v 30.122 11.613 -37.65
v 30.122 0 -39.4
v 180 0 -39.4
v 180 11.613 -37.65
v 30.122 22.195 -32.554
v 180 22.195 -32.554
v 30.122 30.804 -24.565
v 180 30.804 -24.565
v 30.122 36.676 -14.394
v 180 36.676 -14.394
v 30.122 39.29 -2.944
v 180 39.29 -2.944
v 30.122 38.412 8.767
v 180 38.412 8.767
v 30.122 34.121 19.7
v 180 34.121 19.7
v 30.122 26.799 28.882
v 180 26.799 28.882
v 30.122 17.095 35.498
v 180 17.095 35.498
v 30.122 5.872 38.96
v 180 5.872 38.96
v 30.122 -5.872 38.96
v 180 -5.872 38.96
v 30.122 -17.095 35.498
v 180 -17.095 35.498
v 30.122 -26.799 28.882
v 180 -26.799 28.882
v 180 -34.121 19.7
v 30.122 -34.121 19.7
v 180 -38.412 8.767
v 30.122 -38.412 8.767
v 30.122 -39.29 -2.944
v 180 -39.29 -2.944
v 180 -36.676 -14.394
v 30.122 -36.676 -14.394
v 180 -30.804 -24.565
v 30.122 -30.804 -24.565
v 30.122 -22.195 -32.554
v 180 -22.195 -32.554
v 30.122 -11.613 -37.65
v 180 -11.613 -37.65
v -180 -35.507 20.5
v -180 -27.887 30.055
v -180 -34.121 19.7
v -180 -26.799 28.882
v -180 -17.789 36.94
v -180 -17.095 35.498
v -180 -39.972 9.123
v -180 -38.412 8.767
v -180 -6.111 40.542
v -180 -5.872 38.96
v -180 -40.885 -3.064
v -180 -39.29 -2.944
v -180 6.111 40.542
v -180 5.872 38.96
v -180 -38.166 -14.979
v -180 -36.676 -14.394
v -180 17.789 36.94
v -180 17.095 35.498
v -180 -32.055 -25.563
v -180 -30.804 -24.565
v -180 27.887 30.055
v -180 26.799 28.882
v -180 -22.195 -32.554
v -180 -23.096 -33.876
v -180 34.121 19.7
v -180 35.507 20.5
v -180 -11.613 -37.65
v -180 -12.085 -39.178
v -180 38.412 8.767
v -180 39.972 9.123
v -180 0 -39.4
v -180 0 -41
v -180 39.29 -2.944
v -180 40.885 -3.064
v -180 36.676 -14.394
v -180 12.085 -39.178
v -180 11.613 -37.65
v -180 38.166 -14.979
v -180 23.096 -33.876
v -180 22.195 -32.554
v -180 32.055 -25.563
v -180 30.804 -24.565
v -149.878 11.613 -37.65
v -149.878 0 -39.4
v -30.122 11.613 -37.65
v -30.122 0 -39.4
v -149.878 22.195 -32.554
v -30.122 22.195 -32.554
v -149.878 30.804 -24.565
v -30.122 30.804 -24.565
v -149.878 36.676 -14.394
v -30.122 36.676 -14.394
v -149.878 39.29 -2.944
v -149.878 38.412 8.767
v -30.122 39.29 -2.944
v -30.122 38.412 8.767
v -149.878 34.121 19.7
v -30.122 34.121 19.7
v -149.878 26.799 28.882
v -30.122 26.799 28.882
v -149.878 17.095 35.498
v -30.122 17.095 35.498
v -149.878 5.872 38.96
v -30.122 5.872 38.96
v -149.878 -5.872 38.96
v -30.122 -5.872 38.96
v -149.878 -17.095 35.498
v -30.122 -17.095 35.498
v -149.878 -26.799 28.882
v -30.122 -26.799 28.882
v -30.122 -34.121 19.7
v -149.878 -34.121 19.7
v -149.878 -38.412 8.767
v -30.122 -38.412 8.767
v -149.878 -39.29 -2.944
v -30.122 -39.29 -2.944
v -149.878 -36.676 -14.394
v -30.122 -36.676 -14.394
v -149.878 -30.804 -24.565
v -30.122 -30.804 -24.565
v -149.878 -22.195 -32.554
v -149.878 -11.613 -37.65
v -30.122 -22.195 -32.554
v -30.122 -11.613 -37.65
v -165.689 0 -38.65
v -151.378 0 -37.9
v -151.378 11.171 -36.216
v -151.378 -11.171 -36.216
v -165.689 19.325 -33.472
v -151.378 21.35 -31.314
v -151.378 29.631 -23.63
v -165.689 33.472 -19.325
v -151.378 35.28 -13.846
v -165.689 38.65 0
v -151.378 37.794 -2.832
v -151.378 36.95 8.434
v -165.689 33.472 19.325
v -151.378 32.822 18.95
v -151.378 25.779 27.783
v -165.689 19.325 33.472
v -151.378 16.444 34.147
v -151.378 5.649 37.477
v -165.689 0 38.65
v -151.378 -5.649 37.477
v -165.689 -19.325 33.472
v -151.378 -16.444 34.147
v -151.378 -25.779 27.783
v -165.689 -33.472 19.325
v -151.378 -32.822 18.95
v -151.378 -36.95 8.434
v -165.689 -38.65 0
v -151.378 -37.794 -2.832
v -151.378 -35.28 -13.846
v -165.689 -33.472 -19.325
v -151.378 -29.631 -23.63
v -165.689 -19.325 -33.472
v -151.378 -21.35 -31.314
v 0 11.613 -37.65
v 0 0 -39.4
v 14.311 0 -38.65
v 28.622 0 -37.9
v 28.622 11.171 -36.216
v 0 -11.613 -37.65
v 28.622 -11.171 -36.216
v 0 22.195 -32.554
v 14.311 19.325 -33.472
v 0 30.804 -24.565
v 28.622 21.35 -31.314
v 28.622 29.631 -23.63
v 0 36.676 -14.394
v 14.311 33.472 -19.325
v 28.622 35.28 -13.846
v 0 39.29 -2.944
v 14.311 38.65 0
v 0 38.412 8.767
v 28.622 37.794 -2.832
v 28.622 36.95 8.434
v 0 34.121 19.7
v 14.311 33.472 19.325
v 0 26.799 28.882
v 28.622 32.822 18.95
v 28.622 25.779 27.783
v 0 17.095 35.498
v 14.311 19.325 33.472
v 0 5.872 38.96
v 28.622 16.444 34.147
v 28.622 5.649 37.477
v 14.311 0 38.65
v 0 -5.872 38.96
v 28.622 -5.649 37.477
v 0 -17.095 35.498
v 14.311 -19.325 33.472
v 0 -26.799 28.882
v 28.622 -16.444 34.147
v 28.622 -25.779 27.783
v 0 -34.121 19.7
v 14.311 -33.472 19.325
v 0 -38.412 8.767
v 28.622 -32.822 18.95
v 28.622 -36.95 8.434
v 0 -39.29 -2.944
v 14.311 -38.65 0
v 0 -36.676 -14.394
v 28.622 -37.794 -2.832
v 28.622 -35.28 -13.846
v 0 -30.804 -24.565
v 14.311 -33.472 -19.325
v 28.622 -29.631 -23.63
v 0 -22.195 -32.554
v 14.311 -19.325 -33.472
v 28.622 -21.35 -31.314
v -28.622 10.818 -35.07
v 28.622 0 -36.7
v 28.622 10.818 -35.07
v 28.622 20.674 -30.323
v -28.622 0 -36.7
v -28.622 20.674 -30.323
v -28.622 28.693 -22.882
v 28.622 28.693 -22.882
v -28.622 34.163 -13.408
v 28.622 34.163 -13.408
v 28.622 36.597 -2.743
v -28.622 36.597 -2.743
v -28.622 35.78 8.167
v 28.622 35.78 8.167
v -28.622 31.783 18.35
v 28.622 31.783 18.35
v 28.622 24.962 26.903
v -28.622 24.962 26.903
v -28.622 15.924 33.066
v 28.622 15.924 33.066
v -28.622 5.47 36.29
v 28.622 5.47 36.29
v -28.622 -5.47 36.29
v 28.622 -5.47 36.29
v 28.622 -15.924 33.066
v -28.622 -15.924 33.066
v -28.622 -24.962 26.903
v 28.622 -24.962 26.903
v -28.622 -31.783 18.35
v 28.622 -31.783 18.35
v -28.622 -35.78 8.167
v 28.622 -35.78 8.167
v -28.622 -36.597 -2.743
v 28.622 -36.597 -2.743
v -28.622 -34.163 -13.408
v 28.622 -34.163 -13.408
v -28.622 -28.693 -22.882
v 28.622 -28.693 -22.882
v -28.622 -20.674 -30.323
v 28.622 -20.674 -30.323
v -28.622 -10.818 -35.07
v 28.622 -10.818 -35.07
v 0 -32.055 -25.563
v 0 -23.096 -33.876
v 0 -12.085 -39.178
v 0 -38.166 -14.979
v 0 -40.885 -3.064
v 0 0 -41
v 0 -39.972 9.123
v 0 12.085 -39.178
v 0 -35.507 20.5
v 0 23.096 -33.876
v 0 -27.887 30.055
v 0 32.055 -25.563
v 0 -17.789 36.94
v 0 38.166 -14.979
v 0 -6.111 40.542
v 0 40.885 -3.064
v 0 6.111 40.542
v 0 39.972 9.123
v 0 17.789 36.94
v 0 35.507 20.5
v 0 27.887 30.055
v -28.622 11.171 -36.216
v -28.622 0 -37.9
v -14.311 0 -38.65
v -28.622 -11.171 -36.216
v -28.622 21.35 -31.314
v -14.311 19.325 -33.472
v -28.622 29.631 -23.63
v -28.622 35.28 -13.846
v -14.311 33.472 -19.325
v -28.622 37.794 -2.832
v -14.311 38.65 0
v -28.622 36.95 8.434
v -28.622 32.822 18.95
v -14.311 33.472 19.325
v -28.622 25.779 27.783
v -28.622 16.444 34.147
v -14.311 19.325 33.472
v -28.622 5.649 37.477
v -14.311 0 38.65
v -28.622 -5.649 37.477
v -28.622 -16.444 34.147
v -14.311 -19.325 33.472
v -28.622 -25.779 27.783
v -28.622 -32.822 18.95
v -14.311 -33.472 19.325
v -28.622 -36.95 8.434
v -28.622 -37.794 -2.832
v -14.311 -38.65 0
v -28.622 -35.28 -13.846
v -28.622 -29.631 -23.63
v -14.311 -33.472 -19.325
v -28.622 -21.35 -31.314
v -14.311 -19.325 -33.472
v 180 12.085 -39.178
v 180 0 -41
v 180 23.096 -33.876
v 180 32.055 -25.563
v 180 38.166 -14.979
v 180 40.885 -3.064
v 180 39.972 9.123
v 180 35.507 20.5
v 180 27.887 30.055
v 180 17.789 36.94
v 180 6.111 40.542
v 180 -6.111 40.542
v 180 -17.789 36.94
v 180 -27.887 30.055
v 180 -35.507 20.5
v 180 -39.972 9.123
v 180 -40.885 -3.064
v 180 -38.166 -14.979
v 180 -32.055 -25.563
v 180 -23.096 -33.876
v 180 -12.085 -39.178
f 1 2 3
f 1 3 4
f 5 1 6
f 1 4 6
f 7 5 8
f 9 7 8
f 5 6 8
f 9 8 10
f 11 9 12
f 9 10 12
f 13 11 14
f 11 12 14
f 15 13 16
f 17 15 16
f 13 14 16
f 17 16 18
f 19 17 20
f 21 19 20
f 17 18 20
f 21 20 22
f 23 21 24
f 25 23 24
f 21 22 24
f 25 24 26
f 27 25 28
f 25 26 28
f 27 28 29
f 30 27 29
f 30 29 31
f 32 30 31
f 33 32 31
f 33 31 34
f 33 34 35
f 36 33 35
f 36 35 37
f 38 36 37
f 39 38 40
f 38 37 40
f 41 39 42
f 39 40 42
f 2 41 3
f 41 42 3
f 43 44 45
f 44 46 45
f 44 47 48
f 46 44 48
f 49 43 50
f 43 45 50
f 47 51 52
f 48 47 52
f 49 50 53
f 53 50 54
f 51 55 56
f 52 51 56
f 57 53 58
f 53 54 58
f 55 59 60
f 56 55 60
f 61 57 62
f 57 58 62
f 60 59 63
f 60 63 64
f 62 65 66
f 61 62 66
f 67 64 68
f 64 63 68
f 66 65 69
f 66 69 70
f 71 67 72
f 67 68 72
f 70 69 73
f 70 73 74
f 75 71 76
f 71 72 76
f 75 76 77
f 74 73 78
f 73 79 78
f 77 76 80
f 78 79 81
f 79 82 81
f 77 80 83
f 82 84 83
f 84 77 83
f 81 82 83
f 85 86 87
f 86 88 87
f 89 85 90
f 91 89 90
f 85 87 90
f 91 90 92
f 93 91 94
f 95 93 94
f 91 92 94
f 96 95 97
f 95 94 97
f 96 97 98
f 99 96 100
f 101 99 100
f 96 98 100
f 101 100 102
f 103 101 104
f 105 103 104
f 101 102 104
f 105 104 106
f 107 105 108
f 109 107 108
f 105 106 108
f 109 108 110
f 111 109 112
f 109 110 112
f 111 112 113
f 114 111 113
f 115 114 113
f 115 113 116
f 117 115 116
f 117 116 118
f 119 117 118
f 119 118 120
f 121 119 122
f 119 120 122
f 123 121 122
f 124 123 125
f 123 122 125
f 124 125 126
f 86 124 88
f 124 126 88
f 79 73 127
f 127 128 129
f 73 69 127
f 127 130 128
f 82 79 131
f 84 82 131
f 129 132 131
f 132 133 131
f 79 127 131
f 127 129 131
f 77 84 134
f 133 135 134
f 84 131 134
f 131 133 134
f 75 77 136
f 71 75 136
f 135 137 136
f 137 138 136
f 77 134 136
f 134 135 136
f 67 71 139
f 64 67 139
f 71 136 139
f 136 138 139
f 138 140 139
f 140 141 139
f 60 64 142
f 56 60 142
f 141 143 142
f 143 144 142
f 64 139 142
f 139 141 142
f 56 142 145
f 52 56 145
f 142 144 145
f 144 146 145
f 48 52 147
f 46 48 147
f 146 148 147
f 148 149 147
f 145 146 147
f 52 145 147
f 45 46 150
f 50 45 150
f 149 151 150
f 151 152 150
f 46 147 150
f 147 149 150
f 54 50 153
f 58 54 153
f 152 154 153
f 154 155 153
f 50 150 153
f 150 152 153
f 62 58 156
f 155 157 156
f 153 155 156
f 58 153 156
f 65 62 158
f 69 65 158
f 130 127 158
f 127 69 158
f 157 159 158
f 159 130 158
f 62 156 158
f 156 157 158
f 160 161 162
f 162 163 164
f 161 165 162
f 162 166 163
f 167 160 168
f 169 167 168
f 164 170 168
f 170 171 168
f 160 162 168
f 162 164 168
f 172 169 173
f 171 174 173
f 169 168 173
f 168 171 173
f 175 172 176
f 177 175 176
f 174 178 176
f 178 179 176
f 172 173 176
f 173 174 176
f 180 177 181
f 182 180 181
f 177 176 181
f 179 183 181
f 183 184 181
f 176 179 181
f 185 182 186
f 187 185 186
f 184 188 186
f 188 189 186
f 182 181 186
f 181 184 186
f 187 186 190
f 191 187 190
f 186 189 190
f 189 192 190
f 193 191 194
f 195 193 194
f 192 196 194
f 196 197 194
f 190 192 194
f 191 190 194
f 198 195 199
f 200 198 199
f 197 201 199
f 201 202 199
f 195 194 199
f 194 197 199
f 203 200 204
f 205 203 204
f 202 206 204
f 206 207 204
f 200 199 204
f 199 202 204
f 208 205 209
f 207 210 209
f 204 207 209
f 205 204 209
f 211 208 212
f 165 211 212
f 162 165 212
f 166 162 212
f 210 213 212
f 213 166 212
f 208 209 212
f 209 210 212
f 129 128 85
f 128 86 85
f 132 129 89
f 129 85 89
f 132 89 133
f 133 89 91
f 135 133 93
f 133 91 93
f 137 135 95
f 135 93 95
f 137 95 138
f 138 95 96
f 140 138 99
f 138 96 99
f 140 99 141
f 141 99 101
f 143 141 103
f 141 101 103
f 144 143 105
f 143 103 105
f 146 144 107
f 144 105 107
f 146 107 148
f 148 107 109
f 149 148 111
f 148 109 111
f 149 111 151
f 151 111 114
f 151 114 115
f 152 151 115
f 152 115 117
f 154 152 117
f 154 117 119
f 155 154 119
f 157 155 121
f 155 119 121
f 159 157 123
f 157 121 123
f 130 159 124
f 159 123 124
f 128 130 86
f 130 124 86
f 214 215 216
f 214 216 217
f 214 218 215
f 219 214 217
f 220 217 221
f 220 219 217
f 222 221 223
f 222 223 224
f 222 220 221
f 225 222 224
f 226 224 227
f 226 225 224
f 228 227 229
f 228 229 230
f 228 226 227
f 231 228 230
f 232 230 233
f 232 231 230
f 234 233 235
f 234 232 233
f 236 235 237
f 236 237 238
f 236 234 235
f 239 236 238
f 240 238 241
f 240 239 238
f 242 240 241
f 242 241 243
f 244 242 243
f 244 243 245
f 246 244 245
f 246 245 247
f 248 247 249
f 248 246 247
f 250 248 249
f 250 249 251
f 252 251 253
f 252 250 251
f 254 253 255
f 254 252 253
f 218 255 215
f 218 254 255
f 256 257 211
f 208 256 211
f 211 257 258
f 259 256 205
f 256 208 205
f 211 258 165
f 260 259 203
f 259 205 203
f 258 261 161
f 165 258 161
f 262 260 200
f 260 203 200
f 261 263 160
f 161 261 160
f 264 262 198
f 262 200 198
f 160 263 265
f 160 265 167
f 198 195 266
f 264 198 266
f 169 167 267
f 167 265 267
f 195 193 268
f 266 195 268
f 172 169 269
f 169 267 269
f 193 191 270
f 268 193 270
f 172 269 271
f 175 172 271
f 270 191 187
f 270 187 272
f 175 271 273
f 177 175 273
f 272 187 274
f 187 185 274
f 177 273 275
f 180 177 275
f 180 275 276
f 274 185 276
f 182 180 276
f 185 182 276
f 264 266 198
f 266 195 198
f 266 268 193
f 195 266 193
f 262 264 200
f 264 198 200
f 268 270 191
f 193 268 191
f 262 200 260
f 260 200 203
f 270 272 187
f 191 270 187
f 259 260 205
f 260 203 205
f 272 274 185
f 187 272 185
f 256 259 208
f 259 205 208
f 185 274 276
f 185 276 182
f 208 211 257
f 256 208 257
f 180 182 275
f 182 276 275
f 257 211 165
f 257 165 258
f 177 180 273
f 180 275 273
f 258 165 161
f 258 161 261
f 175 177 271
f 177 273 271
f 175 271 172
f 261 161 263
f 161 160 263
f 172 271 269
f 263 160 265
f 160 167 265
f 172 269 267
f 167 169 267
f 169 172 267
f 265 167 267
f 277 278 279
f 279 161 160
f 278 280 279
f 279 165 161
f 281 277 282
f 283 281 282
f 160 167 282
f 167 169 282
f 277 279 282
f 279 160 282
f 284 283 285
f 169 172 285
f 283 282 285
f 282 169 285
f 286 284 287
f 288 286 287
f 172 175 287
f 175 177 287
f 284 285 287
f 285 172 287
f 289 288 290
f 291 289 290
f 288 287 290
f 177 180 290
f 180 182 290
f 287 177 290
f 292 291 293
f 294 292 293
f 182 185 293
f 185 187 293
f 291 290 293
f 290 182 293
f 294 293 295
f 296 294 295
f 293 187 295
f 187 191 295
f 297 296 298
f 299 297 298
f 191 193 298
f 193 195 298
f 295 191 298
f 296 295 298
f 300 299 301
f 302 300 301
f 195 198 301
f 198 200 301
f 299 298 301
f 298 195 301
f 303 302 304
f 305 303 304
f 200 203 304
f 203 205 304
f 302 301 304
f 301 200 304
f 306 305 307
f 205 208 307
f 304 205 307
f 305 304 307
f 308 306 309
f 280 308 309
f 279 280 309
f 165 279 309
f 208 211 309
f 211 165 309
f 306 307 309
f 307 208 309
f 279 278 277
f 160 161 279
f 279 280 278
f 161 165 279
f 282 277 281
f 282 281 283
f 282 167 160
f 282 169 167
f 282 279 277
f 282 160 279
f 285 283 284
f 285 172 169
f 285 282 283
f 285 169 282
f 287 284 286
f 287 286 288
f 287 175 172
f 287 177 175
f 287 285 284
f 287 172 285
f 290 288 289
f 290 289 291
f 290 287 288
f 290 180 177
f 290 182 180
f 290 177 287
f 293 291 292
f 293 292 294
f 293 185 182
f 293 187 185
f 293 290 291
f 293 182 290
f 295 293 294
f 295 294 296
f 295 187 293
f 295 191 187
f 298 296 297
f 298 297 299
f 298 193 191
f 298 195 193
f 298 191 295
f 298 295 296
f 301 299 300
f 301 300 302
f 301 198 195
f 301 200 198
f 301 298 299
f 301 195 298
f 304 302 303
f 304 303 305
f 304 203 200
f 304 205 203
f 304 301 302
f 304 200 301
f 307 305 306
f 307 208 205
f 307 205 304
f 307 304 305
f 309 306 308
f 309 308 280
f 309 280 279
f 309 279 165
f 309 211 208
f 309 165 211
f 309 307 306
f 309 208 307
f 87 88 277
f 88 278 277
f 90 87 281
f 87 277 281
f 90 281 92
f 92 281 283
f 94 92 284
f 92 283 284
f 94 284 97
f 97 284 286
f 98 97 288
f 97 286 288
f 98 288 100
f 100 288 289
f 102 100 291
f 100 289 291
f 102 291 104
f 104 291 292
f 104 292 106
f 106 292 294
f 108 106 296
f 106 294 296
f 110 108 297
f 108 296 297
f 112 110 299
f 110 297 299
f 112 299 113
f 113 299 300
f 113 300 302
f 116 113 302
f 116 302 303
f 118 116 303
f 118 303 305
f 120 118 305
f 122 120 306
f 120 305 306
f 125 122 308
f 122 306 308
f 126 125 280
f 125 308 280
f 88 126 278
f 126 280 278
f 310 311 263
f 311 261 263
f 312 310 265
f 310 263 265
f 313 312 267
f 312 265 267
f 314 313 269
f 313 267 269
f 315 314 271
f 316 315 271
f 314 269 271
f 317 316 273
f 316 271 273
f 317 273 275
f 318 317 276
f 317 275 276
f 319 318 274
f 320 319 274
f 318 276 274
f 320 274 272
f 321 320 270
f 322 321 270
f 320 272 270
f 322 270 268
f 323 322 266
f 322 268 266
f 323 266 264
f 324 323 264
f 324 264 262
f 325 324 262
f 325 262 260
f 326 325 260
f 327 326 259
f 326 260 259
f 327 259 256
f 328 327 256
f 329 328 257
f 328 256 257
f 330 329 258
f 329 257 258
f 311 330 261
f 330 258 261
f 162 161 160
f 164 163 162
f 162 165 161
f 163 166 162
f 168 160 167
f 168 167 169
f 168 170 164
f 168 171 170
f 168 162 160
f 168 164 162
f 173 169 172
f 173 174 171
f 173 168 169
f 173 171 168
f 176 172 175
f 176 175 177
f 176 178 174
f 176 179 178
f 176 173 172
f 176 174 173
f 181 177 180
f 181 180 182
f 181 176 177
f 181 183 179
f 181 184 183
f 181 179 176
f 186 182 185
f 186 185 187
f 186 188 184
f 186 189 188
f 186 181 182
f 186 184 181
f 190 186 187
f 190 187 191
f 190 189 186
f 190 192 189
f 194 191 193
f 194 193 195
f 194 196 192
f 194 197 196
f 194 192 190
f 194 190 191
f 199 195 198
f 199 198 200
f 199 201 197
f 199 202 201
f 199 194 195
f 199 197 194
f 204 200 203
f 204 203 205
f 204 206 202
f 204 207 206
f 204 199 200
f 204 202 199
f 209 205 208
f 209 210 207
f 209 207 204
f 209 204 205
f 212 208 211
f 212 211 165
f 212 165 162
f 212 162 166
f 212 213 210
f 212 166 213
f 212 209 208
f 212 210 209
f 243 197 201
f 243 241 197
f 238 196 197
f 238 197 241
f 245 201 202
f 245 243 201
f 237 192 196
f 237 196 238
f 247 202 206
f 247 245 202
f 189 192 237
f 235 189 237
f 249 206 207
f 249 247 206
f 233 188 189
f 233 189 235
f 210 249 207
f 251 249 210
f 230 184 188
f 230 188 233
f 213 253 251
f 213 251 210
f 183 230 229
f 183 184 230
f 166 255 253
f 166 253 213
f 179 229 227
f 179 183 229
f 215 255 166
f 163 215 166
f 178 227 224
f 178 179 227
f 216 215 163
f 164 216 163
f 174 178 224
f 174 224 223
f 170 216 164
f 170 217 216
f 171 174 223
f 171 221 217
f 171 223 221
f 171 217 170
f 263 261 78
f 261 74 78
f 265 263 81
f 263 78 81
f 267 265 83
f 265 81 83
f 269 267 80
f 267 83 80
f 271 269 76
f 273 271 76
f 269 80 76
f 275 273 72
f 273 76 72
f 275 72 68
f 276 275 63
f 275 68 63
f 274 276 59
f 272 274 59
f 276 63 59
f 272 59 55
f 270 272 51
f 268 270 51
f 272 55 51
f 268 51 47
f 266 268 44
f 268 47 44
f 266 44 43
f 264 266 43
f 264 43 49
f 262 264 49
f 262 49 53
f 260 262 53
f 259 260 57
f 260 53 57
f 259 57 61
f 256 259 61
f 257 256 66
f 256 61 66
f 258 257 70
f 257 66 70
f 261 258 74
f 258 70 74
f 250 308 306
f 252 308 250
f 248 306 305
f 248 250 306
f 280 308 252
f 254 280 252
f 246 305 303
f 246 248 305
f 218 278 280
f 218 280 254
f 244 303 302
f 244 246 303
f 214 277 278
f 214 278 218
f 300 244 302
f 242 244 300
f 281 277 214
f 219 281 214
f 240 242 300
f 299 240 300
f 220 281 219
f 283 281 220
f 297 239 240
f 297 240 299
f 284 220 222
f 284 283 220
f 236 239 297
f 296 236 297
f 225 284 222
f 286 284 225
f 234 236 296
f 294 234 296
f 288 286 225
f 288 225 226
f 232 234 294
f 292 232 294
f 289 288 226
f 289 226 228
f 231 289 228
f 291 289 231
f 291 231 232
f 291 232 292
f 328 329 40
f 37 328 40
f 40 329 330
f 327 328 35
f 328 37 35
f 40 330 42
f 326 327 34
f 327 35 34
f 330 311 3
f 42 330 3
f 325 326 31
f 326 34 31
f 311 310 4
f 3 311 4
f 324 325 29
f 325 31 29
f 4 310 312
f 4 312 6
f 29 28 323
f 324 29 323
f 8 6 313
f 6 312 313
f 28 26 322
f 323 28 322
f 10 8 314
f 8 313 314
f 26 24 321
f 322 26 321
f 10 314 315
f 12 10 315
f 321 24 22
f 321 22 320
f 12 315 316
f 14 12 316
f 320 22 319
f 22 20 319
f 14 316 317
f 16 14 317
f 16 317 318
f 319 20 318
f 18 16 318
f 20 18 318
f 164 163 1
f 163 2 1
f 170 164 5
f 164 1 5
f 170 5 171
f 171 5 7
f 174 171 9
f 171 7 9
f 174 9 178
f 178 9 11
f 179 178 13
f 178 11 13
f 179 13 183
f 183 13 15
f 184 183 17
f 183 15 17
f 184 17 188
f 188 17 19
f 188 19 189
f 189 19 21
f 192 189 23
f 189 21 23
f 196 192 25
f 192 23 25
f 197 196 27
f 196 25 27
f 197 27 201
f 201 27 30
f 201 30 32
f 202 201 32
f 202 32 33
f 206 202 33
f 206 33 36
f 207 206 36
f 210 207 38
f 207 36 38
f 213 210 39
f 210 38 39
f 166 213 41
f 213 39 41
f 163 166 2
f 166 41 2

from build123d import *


with BuildPart() as part:
    # Sketch2 → Revolve1 (revolve)
    with BuildSketch(Plane(origin=(0, 0, 0), x_dir=(1, 0, 0), z_dir=(0, 1, 0))):
        Polygon((180, 39.4), (180, 41), (0, 41), (0, 39.4), (28.621705032, 37.9), (30.121705032, 39.4), align=None)
    revolve(axis=Axis((0, 0, 0), (1, 0, 0)))


with BuildPart() as body_2:
    # Sketch2<3> → Revolve2 (revolve)
    with BuildSketch(Plane(origin=(0, 0, 0), x_dir=(1, 0, 0), z_dir=(0, 1, 0))):
        Polygon((0, 39.4), (0, 41), (-180, 41), (-180, 39.4), (-151.378294968, 37.9), (-149.878294968, 39.4), (-30.121705032, 39.4), (-28.621705032, 37.9), align=None)
    revolve(axis=Axis((0, 0, 0), (1, 0, 0)))


with BuildPart() as body_3:
    # Sketch3 → Revolve3 (revolve)
    with BuildSketch(Plane(origin=(0, 0, 0), x_dir=(1, 0, 0), z_dir=(0, 1, 0))):
        Polygon((-28.621705032, 37.9), (0, 39.4), (28.621705032, 37.9), (28.621705032, 36.7), (-28.621705032, 36.7), align=None)
    revolve(axis=Axis((0, 0, 0), (1, 0, 0)))


solid = Compound([part.part, body_2.part, body_3.part])
